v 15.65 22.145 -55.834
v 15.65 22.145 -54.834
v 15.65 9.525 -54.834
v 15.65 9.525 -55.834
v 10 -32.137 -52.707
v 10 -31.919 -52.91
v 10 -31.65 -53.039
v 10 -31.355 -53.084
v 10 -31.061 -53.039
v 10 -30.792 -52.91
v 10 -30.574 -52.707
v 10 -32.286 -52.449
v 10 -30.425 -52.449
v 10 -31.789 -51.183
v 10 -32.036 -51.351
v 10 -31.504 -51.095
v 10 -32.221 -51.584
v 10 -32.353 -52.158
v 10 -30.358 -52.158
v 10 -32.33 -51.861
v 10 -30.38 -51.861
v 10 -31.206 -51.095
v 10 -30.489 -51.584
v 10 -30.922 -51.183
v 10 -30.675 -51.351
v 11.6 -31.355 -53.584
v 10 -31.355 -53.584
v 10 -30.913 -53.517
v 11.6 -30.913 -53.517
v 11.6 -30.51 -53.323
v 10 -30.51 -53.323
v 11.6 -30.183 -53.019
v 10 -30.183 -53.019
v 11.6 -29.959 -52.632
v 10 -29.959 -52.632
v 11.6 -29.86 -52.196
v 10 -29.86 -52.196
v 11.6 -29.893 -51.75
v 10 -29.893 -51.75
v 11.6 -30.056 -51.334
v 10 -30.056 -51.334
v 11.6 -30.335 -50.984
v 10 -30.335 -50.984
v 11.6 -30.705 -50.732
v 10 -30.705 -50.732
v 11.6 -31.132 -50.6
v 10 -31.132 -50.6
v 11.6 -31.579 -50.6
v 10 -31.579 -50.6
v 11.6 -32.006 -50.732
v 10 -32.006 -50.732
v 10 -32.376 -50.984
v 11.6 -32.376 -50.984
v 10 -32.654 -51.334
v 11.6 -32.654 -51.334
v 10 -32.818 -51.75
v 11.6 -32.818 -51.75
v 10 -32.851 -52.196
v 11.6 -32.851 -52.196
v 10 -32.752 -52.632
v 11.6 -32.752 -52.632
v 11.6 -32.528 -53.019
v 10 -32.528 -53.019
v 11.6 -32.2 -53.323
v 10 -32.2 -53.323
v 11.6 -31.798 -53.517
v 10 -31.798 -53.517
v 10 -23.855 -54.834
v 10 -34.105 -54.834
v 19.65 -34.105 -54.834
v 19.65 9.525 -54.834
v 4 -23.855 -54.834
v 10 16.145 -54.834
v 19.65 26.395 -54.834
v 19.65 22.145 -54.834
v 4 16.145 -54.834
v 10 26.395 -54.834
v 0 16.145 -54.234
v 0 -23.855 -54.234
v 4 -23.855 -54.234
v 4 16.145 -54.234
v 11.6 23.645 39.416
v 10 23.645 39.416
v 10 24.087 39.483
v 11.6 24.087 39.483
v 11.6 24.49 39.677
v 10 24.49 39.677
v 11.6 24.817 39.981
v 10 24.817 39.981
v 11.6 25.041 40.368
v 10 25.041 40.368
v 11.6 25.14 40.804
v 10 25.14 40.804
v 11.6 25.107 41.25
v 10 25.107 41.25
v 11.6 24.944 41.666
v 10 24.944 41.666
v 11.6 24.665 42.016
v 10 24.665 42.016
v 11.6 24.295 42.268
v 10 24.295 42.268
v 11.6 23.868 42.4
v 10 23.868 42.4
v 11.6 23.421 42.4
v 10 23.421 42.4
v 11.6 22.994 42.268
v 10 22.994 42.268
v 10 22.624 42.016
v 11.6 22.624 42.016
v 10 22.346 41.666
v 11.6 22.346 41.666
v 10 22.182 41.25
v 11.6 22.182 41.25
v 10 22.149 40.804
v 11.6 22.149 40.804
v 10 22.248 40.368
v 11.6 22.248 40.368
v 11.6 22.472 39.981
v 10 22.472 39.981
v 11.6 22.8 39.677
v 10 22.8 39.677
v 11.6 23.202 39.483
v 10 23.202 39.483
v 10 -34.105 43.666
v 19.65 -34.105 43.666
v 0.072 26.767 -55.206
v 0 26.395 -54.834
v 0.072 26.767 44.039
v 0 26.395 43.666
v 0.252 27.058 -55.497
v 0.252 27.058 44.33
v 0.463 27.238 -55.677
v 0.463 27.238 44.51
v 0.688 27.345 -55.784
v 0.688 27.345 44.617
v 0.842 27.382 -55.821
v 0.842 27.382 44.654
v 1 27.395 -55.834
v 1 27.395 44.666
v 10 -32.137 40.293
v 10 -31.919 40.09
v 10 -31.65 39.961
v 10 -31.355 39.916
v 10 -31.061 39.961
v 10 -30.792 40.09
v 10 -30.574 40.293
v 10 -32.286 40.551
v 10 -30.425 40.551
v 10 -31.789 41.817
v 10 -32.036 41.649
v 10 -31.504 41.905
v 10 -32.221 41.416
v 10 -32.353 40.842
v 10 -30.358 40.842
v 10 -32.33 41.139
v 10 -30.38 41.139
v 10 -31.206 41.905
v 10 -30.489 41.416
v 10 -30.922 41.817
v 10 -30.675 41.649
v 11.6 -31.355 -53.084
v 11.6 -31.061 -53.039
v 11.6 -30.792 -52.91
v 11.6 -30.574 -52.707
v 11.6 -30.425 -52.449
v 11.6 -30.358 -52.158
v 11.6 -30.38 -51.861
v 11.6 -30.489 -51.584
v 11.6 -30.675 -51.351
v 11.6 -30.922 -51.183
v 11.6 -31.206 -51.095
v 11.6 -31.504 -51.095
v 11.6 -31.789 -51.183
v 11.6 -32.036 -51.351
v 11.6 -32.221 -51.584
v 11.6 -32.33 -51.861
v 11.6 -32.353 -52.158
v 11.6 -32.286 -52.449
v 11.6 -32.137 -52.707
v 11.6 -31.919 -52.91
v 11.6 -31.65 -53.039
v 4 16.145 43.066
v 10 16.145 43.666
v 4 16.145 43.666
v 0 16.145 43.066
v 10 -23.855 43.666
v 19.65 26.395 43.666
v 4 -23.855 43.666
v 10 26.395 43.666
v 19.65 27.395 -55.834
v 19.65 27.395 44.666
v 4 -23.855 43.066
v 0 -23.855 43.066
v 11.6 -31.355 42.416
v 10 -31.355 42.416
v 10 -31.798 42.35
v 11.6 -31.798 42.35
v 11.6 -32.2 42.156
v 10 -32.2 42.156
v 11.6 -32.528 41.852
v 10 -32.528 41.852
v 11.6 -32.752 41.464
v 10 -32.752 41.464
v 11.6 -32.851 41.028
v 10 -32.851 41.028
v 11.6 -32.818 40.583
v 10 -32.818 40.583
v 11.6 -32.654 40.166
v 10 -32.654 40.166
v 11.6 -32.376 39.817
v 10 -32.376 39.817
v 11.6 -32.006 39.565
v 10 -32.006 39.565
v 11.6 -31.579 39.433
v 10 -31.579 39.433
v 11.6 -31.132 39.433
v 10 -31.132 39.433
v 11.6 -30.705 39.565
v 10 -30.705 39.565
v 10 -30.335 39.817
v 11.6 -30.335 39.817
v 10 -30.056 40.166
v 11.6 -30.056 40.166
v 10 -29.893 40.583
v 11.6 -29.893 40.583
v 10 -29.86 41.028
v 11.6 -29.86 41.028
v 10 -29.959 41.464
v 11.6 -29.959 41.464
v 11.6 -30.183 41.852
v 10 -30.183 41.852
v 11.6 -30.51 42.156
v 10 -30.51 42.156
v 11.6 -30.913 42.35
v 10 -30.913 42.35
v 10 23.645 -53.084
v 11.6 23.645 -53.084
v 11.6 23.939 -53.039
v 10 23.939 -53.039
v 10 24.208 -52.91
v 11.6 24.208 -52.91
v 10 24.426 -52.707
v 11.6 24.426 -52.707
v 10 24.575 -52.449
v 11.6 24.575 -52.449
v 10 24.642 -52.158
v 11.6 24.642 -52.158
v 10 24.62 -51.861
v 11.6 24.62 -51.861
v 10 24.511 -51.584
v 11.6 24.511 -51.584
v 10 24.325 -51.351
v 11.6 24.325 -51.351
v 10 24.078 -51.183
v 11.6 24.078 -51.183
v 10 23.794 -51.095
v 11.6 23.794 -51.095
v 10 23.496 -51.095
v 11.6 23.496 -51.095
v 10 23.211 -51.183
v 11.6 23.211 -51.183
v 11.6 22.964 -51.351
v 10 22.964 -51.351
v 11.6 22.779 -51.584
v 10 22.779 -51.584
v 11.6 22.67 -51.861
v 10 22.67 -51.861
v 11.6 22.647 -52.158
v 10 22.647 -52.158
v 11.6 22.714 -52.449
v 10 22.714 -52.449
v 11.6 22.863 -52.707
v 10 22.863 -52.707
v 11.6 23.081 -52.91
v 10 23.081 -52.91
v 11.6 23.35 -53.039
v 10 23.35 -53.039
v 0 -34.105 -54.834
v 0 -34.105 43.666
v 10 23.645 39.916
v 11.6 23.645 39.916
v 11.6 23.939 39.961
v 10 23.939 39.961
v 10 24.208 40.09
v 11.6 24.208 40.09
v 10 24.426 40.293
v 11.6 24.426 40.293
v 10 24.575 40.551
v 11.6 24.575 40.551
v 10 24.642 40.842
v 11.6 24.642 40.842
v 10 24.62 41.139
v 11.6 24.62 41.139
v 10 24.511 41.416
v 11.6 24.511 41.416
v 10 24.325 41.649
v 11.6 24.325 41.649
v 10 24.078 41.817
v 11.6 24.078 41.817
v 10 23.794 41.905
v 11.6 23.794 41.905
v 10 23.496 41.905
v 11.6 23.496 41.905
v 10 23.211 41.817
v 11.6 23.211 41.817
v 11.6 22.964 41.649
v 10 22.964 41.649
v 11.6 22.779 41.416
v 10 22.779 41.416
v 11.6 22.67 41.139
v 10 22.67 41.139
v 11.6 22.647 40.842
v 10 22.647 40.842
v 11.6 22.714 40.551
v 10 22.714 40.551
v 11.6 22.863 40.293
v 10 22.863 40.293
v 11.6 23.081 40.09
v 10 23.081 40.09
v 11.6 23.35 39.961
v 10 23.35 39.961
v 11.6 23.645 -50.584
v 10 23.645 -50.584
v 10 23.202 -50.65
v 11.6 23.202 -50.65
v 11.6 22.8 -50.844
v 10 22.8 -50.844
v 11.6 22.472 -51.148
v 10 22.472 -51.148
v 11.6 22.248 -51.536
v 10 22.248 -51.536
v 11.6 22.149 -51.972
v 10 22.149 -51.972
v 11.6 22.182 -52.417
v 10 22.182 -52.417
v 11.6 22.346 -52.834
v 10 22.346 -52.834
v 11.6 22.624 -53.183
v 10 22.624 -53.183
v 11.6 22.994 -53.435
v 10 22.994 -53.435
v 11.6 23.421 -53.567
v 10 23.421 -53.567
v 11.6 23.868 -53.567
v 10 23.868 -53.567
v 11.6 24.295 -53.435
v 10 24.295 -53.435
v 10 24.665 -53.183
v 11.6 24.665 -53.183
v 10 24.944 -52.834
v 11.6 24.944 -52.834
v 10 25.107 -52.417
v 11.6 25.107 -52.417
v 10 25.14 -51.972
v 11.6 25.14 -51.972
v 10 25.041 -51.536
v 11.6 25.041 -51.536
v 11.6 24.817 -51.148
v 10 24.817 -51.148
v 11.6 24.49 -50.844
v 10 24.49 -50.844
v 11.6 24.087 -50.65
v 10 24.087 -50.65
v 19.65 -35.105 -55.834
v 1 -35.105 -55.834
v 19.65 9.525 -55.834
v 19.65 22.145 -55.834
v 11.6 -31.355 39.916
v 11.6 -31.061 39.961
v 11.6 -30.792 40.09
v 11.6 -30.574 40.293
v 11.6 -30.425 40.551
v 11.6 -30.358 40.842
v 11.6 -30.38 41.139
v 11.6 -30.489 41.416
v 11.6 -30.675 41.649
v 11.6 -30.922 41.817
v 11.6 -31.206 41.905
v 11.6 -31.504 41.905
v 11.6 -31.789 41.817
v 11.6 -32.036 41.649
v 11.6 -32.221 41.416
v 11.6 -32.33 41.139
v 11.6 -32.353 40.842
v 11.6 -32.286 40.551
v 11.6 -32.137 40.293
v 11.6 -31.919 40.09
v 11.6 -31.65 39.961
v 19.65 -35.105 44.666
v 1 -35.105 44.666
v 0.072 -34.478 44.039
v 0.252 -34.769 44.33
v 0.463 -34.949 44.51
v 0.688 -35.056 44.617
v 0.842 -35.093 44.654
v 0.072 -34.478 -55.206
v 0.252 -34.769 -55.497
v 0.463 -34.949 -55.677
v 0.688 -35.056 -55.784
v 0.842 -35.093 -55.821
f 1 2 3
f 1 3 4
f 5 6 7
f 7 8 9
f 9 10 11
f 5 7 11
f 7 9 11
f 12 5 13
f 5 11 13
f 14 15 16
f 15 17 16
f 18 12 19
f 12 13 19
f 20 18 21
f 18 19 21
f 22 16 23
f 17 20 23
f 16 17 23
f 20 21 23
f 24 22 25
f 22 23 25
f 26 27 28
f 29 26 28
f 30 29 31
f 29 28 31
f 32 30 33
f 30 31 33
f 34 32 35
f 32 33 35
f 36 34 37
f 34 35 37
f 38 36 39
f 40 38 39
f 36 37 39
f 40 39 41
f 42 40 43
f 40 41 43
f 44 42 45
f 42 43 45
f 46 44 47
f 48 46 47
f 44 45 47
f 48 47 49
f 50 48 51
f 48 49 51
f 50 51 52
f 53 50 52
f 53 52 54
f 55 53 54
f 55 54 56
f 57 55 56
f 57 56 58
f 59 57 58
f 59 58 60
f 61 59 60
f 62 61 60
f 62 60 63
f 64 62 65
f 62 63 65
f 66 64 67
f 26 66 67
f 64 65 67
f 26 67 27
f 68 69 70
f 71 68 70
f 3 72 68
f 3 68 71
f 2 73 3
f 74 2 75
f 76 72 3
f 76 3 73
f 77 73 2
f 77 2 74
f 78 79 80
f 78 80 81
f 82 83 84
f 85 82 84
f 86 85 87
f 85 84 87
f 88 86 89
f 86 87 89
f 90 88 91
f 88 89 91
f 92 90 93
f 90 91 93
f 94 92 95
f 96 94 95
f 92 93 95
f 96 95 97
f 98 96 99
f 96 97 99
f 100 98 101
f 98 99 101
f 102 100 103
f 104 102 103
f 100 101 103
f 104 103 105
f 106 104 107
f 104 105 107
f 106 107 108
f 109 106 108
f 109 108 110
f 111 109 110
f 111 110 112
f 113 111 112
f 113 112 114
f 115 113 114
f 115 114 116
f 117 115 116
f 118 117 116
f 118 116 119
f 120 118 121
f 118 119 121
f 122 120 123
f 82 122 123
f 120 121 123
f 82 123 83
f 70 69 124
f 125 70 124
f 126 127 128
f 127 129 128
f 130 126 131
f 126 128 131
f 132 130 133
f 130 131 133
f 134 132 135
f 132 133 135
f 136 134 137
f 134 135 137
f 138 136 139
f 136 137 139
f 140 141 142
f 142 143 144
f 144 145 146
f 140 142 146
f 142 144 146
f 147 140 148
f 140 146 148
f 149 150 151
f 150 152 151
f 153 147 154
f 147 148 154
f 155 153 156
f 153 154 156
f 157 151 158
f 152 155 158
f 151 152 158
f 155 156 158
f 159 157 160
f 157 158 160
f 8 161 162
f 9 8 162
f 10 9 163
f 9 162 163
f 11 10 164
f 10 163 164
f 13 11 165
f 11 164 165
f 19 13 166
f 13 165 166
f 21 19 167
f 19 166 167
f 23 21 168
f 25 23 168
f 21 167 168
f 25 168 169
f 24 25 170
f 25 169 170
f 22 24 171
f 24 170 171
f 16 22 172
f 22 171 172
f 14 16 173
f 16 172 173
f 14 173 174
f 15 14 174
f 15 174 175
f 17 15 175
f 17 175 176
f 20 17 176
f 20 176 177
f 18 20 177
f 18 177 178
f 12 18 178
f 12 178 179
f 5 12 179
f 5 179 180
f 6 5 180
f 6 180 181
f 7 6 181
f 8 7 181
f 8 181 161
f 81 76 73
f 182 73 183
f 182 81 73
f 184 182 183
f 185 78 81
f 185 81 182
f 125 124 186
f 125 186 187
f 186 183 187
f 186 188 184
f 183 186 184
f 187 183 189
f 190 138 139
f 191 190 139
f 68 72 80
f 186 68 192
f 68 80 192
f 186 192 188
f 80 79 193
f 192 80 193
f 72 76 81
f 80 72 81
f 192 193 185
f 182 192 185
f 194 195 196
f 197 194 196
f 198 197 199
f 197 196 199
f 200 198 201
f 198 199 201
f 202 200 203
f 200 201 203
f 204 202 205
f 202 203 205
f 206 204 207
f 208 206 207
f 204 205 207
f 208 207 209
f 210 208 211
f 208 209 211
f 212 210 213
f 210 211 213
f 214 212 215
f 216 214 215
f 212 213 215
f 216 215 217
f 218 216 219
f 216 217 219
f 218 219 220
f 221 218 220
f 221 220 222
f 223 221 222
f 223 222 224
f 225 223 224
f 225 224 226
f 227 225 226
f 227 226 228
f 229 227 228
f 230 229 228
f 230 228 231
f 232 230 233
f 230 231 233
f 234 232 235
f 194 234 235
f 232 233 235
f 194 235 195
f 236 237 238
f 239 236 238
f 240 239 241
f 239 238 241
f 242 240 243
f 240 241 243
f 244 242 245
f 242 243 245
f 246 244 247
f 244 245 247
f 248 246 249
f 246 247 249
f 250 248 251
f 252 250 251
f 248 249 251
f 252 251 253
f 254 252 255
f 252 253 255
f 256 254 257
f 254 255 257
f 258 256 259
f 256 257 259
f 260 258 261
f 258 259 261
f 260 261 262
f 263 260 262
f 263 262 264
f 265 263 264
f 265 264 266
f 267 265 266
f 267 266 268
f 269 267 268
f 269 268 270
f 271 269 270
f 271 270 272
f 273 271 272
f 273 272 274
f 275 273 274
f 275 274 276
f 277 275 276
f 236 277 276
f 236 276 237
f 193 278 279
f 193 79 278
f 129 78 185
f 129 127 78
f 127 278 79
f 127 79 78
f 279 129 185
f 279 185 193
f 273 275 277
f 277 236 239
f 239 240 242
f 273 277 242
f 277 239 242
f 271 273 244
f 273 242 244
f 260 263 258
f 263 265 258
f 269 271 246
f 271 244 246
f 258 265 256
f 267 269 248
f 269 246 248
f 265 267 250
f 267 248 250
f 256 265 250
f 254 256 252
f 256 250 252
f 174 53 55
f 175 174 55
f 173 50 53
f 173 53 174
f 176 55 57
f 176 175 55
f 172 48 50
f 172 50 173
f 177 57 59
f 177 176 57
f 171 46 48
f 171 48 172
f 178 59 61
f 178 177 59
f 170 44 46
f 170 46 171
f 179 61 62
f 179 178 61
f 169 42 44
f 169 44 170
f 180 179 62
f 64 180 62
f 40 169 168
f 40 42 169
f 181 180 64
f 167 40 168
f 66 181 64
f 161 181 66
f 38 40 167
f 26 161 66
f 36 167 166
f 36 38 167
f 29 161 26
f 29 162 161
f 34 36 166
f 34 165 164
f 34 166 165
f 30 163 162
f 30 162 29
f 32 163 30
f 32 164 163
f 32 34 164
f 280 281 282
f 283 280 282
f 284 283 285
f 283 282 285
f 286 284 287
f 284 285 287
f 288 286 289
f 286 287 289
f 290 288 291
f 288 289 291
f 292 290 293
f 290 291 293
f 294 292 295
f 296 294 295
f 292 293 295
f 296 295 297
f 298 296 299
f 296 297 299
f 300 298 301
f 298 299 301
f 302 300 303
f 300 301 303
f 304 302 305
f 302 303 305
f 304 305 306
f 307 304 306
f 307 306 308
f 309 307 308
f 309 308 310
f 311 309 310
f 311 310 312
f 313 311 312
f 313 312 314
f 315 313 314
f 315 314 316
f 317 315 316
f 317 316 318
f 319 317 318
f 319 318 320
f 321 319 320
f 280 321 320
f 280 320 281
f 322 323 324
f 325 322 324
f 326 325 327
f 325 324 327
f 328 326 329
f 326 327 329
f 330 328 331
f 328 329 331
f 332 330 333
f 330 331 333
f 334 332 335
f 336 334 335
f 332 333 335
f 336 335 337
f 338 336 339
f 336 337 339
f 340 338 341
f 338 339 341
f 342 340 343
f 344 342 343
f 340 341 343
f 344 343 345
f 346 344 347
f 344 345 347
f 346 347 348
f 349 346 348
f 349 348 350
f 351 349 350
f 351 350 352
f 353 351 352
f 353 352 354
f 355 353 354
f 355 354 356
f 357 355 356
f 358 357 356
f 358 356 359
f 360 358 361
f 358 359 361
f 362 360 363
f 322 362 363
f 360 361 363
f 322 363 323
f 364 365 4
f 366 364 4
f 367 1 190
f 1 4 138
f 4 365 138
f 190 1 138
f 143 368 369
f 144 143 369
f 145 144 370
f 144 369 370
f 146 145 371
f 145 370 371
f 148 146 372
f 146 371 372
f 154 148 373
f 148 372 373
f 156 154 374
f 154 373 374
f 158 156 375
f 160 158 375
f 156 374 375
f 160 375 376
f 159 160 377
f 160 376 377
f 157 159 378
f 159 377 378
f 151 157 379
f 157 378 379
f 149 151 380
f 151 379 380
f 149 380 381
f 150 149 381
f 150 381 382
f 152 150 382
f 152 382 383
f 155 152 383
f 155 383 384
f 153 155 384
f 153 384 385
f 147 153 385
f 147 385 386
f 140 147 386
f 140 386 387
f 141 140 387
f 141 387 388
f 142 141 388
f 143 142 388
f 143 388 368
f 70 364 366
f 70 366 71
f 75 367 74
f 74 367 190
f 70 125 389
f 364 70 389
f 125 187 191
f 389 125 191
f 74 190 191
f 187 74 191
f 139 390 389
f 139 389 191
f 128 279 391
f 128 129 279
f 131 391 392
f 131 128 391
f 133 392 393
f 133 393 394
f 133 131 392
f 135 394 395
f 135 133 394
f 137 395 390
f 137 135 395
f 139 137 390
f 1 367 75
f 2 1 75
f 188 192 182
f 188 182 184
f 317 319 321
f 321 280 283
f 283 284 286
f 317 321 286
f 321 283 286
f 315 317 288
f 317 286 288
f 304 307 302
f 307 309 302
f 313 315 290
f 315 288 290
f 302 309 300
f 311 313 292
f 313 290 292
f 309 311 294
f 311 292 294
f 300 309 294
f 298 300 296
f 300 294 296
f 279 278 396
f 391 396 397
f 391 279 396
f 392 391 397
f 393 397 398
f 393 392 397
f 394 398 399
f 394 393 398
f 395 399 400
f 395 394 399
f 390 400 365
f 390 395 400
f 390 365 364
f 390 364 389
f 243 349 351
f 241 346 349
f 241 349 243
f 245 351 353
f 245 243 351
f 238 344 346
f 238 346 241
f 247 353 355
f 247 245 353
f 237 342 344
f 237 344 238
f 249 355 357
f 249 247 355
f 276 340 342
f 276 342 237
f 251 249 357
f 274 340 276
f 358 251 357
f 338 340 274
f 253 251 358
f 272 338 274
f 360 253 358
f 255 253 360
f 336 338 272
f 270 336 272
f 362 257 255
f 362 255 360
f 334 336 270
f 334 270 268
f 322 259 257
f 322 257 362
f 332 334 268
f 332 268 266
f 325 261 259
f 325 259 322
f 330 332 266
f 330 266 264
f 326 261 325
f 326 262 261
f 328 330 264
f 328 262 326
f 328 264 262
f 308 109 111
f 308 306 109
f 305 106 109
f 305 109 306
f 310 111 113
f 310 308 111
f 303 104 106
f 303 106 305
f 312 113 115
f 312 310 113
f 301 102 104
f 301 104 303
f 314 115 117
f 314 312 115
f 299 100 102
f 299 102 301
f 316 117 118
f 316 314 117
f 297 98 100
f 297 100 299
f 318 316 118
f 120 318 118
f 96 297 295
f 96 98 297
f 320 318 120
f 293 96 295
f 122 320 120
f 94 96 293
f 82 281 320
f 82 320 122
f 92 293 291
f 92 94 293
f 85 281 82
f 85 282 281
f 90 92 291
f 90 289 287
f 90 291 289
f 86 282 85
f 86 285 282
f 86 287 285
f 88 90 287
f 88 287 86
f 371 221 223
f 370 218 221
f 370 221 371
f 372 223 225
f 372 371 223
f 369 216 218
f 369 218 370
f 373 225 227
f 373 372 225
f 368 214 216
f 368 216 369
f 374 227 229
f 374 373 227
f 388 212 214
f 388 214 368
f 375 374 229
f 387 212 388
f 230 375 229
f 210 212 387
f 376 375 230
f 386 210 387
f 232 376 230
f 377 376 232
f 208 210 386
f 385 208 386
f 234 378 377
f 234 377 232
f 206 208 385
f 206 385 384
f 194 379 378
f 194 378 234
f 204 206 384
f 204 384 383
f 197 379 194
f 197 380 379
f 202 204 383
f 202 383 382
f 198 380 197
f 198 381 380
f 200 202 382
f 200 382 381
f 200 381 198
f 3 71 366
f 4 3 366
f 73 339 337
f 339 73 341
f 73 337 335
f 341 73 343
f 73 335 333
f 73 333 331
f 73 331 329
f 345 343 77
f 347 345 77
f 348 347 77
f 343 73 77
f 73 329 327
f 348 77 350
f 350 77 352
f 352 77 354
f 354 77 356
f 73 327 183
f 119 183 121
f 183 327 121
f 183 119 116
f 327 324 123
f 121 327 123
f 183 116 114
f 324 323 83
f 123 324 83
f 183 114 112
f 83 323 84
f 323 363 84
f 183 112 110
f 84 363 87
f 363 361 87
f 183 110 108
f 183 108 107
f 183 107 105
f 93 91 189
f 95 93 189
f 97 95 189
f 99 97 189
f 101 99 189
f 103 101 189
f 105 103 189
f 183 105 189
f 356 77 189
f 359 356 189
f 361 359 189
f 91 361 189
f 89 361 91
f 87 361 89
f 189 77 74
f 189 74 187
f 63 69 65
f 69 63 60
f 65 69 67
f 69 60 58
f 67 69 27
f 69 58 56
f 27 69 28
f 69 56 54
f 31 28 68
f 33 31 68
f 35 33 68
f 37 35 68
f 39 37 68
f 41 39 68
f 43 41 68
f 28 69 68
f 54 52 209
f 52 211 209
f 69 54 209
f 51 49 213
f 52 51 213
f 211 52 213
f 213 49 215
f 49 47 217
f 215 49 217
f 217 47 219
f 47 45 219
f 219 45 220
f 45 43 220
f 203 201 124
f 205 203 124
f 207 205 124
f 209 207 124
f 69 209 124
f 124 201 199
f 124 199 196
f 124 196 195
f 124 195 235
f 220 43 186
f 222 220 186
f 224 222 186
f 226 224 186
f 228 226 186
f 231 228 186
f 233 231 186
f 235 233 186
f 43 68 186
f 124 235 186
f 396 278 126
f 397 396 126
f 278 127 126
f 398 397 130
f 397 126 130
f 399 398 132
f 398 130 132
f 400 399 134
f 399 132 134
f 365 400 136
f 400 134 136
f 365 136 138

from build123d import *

# Parameters (mm, degrees)
SKETCH1_W            = 92.135626016
SKETCH1_H            = 40
BOSS_EXTRUDE2_DEPTH  = 10
SKETCH2_R            = 1.5
BOSS_EXTRUDE3_DEPTH  = 1.6
SKETCH3_R            = 1
CUT_EXTRUDE1_DEPTH   = 2
SKETCH4_W            = 100.5
SKETCH4_H            = 62.5
SKETCH4_W_2          = 98.5
SKETCH4_H_2          = 60.5
BOSS_EXTRUDE4_DEPTH  = 19.65
SKETCH5_W            = 98
SKETCH5_H            = 40
CUT_EXTRUDE5_DEPTH   = 14.65
SKETCH6_W            = 98.5
SKETCH6_H            = 10.25
BOSS_EXTRUDE5_DEPTH  = 10
SKETCH7_W            = 0.6
SKETCH7_H            = 40.584325063
BOSS_EXTRUDE11_DEPTH = 4
SKETCH8_W            = 0.6
SKETCH8_H            = 40
BOSS_EXTRUDE12_DEPTH = 4
FILLET1_R            = 1
CUT_EXTRUDE6_DEPTH   = 4
SKETCH10_W           = 1
SKETCH10_H           = 2.5
CUT_EXTRUDE8_DEPTH   = 4


with BuildPart() as part:
    # Sketch1 → Boss-Extrude2 (new body)
    with BuildSketch(Plane(origin=(0, 0, 0), x_dir=(0, 0, -1), z_dir=(1, 0, 0))):
        Polygon((-40.481927711, 26.144578313), (-43.416301695, 26.144578313), (-43.416301695, -33.855421687), (-40.481927711, -33.855421687), (54.583698305, -33.855421687), (54.583698305, 26.144578313), (33.734939759, 26.144578313), align=None)
        with Locations((5.585885297, -3.855421687)):
            Rectangle(SKETCH1_W, SKETCH1_H, mode=Mode.SUBTRACT)
    extrude(amount=BOSS_EXTRUDE2_DEPTH)

    # Sketch2 → Boss-Extrude3 (add)
    with BuildSketch(Plane(origin=(10, 0, 0), x_dir=(0, 0, -1), z_dir=(1, 0, 0))):
        with Locations((-40.916301695, 23.644578313)):
            Circle(SKETCH2_R)
        with Locations(Location((52.083698305, 23.644578313, 0), (0, 0, 180))):
            Circle(SKETCH2_R)
        with Locations((52.083698305, -31.355421687)):
            Circle(SKETCH2_R)
        with Locations(Location((-40.916301695, -31.355421687, 0), (0, 0, 180))):
            Circle(SKETCH2_R)
    extrude(amount=BOSS_EXTRUDE3_DEPTH)

    # Sketch3 → Cut-Extrude1 (cut)
    with BuildSketch(Plane(origin=(11.6, 0, 0), x_dir=(0, 0, -1), z_dir=(1, 0, 0))):
        with Locations((-40.916301695, 23.644578313)):
            Circle(SKETCH3_R)
        with Locations((52.083698305, 23.644578313)):
            Circle(SKETCH3_R)
        with Locations((52.083698305, -31.355421687)):
            Circle(SKETCH3_R)
        with Locations((-40.916301695, -31.355421687)):
            Circle(SKETCH3_R)
    extrude(amount=-CUT_EXTRUDE1_DEPTH, mode=Mode.SUBTRACT)

    # Sketch5 → Cut-Extrude5 (cut)
    with BuildSketch(Plane.ZY):
        with Locations((-5.583698305, -3.855421687)):
            Rectangle(SKETCH5_W, SKETCH5_H)
    extrude(amount=-CUT_EXTRUDE5_DEPTH, mode=Mode.SUBTRACT)


with BuildPart() as body_2:
    # Sketch4 → Boss-Extrude4 (new body)
    with BuildSketch(Plane.ZY):
        with Locations((-5.583698305, -3.855421687)):
            Rectangle(SKETCH4_W, SKETCH4_H)
        with Locations((-5.583698305, -3.855421687)):
            Rectangle(SKETCH4_W_2, SKETCH4_H_2, mode=Mode.SUBTRACT)
    extrude(amount=-BOSS_EXTRUDE4_DEPTH)



with BuildPart() as cut_extrude5_piece_1:
    # of the separate pieces the step leaves, piece 1, a body of its own (cut_extrude5_pieces)
    add(part.part.solids().sort_by_distance((0, 26.144578313, -54.583698305))[0])


with BuildPart() as cut_extrude5_piece_2:
    # of the separate pieces the step leaves, piece 2, a body of its own (cut_extrude5_pieces)
    add(part.part.solids().sort_by_distance((0, -23.855421687, 43.416301695))[0])


with BuildPart() as body_2_1:
    add(body_2.part)

    add(cut_extrude5_piece_1.part)  # Boss-Extrude5 merges Cut-Extrude5 piece 1

    add(cut_extrude5_piece_2.part)  # Boss-Extrude5 merges Cut-Extrude5 piece 2
    # Sketch6 → Boss-Extrude5 (add)
    with BuildSketch(Plane.ZY):
        with Locations((-5.583698305, 21.269578313)):
            Rectangle(SKETCH6_W, SKETCH6_H)
        with Locations((-5.583698305, -28.980421687)):
            Rectangle(SKETCH6_W, SKETCH6_H)
    extrude(amount=-BOSS_EXTRUDE5_DEPTH)

    # Sketch7 → Boss-Extrude11 (add)
    with BuildSketch(Plane.ZY):
        with Locations((-54.533698305, -4.147584219)):
            Rectangle(SKETCH7_W, SKETCH7_H)
    extrude(amount=-BOSS_EXTRUDE11_DEPTH)

    # Sketch8 → Boss-Extrude12 (add)
    with BuildSketch(Plane.ZY):
        with Locations((43.366301695, -3.855421687)):
            Rectangle(SKETCH8_W, SKETCH8_H)
    extrude(amount=-BOSS_EXTRUDE12_DEPTH)

    # Fillet1
    fillet1_edges = [body_2_1.edges().sort_by_distance(p)[0] for p in [
        (0, 27.394578313, -5.583698305),
        (0, -3.855421687, 44.666301695),
        (0, -35.105421687, -5.583698305),
        (0, -3.855421687, -55.833698305),
    ]]
    fillet(fillet1_edges, radius=FILLET1_R)

    # Sketch9 → Cut-Extrude6 (cut)
    with BuildSketch(Plane(origin=(19.65, 0, 0), x_dir=(0, 0, -1), z_dir=(1, 0, 0))):
        Polygon((54.833698305, 22.144578313), (47.033698305, 22.144578313), (47.033698305, 12.024578313), (54.833698305, 12.024578313), (55.833698305, 12.024578313), (55.833698305, 22.144578313), align=None)
    extrude(amount=-CUT_EXTRUDE6_DEPTH, mode=Mode.SUBTRACT)

    # Sketch10 → Cut-Extrude8 (cut)
    with BuildSketch(Plane(origin=(19.65, 0, 0), x_dir=(0, 0, -1), z_dir=(1, 0, 0))):
        with Locations((55.333698305, 10.774578313)):
            Rectangle(SKETCH10_W, SKETCH10_H)
    extrude(amount=-CUT_EXTRUDE8_DEPTH, mode=Mode.SUBTRACT)


solid = body_2_1.part
